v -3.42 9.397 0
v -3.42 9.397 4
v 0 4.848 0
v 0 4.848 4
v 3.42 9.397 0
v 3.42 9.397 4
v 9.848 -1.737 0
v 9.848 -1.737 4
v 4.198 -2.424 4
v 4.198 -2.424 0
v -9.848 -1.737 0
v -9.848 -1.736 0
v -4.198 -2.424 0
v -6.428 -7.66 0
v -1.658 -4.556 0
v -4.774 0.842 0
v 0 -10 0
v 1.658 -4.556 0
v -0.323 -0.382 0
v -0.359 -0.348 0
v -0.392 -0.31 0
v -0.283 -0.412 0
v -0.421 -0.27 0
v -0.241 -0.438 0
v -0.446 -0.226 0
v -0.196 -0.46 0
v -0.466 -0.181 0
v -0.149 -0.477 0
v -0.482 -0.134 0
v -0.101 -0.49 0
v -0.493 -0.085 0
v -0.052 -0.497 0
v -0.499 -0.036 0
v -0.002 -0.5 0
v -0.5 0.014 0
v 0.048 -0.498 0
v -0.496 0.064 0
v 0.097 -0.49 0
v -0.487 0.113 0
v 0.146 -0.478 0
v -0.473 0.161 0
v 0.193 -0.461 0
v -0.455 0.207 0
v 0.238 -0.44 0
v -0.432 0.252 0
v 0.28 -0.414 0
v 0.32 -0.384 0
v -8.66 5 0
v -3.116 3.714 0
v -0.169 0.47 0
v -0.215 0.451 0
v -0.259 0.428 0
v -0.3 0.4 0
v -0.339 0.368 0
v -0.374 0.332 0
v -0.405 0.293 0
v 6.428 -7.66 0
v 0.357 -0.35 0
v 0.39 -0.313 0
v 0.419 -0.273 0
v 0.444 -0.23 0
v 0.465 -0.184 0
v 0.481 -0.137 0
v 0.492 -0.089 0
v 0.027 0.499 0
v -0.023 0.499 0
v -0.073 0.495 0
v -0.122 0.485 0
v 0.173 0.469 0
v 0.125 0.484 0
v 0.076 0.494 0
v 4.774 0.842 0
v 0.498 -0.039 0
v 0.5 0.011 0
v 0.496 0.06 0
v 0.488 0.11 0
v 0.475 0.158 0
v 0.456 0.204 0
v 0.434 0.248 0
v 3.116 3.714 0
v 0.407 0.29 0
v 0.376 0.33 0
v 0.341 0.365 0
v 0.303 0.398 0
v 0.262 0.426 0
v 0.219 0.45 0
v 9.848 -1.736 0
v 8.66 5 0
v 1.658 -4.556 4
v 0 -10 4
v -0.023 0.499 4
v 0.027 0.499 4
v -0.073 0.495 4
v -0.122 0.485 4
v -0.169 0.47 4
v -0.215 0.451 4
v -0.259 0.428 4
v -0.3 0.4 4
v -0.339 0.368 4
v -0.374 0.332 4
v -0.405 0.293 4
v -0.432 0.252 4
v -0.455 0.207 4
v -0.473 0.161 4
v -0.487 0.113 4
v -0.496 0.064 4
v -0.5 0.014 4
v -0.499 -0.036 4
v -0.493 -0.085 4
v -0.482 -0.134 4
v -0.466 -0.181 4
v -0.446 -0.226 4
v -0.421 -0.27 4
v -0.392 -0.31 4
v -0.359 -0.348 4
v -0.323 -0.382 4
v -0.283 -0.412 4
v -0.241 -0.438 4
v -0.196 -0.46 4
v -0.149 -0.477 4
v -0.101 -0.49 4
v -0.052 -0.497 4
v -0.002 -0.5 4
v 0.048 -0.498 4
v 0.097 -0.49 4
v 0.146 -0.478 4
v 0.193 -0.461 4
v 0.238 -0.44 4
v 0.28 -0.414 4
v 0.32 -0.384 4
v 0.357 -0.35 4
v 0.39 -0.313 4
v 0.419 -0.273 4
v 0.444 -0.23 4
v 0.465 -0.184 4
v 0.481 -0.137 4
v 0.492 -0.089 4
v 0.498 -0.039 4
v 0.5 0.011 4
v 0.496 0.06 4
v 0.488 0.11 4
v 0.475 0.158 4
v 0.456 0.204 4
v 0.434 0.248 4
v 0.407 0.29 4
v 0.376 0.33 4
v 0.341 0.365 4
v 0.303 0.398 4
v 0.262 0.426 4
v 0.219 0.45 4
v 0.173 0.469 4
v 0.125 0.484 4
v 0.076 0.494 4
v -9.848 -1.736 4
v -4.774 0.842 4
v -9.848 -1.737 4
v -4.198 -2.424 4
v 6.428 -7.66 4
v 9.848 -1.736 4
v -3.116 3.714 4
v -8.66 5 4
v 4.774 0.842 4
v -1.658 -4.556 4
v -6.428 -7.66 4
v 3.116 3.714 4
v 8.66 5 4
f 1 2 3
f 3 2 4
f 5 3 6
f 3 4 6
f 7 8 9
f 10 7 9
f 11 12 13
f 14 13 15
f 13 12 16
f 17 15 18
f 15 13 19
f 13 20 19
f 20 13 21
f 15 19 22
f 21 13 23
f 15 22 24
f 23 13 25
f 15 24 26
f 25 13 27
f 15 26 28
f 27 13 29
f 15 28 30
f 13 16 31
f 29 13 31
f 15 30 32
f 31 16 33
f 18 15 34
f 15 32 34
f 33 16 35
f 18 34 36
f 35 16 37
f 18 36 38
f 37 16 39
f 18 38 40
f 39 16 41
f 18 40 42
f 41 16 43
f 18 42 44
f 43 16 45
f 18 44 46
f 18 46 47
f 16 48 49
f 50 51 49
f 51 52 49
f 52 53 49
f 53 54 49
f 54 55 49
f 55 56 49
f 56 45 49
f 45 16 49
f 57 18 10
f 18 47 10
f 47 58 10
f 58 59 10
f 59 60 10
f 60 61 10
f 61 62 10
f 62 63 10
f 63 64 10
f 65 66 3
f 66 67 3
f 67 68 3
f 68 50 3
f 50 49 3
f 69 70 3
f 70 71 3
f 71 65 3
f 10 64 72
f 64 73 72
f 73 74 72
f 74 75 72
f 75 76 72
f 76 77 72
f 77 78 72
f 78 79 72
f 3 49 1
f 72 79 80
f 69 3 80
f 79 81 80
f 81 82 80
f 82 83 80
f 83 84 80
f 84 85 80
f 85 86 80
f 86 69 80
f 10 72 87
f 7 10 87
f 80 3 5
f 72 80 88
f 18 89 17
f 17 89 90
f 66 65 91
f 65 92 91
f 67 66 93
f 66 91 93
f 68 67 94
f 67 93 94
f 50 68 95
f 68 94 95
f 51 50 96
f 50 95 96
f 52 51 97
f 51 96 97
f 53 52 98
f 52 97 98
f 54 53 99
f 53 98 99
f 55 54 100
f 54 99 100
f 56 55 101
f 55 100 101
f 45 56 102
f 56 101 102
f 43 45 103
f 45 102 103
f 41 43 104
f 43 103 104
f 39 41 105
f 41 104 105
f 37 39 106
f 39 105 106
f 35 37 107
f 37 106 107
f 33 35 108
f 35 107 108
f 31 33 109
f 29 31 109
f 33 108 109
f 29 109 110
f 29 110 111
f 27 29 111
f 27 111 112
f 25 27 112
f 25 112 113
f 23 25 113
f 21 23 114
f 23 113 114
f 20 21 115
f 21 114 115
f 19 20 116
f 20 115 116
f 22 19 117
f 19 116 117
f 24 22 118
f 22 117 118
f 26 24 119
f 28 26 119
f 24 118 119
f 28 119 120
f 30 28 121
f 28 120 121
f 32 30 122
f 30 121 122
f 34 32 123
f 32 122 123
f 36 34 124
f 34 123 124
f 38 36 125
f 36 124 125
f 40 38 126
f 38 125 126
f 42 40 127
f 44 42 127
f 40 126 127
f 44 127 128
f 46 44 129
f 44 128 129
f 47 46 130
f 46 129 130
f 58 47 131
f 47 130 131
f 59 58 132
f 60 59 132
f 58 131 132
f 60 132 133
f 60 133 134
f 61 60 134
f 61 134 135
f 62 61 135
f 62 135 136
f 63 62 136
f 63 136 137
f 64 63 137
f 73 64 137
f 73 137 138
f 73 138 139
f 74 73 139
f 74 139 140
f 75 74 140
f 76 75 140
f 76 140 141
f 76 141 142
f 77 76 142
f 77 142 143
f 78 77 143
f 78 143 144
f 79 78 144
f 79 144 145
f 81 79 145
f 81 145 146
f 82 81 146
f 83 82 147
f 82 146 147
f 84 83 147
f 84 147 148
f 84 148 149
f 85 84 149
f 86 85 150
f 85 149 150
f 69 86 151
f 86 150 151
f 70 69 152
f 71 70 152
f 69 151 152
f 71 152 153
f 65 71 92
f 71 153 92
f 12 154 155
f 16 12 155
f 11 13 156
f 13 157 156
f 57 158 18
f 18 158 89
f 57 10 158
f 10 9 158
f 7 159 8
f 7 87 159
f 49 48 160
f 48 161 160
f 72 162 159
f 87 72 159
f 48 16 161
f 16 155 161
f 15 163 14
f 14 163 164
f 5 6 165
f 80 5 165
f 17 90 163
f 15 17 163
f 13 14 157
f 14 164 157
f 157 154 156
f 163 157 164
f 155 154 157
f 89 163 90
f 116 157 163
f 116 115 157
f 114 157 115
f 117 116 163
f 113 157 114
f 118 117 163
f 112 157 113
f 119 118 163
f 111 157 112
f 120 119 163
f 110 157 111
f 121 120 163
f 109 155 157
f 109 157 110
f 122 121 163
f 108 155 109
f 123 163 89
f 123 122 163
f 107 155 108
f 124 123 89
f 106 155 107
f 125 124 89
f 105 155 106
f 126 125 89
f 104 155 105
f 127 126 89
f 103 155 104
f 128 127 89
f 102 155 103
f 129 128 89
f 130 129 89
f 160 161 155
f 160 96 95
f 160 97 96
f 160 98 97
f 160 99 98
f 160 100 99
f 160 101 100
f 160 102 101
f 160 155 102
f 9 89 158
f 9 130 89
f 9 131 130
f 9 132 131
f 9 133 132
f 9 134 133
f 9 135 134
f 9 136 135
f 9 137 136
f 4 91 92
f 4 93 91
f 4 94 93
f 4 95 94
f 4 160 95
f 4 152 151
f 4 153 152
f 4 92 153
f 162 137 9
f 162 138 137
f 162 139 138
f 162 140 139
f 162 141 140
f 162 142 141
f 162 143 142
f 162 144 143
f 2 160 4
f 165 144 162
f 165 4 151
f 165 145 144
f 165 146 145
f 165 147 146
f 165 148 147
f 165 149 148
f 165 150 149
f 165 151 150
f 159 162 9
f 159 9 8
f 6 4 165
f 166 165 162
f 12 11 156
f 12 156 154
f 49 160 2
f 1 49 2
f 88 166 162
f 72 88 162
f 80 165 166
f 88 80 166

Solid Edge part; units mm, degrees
sketch "Sketch1" plane through (0, 0, 0) normal (0, 0, 1) x (1, 0, 0)
  circle A0 centre (0, 0) radius 10
extrude "Protrusion1" add sketch "Sketch1" along normal blind 4
sketch "Sketch2" plane through (0, 0, 4) normal (0, 0, 1) x (1, 0, 0)
  line L0 (-3.4202, 9.3969) -> (0, 4.848)
  line L1 (0, 4.848) -> (3.4202, 9.3969)
  line L2 (3.4202, 9.3969) -> (0, 11.9685)
  line L3 (0, 11.9685) -> (-3.4202, 9.3969)
  line L4 (-8.6603, 5) -> (-3.1162, 3.7138)
  line L5 (-3.1162, 3.7138) -> (-3.4202, 9.3969)
  line L6 (-3.4202, 9.3969) -> (-7.6932, 9.1684)
  line L7 (-7.6932, 9.1684) -> (-8.6603, 5)
  line L8 (-9.8481, -1.7365) -> (-4.7743, 0.8418)
  line L9 (-4.7743, 0.8418) -> (-8.6603, 5)
  line L10 (-8.6603, 5) -> (-11.7866, 2.0783)
  line L11 (-11.7866, 2.0783) -> (-9.8481, -1.7365)
  line L12 (-6.4279, -7.6604) -> (-4.1985, -2.424)
  line L13 (-4.1985, -2.424) -> (-9.8481, -1.7365)
  line L14 (-9.8481, -1.7365) -> (-10.365, -5.9842)
  line L15 (-10.365, -5.9842) -> (-6.4279, -7.6604)
  line L16 (0, -10) -> (-1.6581, -4.5556)
  line L17 (-1.6581, -4.5556) -> (-6.4279, -7.6604)
  line L18 (-6.4279, -7.6604) -> (-4.0935, -11.2467)
  line L19 (-4.0935, -11.2467) -> (0, -10)
  line L20 (6.4279, -7.6604) -> (1.6581, -4.5556)
  line L21 (1.6581, -4.5556) -> (0, -10)
  line L22 (0, -10) -> (4.0935, -11.2467)
  line L23 (4.0935, -11.2467) -> (6.4279, -7.6604)
  line L24 (9.8481, -1.7365) -> (4.1985, -2.424)
  line L25 (4.1985, -2.424) -> (6.4279, -7.6604)
  line L26 (6.4279, -7.6604) -> (10.365, -5.9842)
  line L27 (10.365, -5.9842) -> (9.8481, -1.7365)
  line L28 (8.6603, 5) -> (4.7743, 0.8418)
  line L29 (4.7743, 0.8418) -> (9.8481, -1.7365)
  line L30 (9.8481, -1.7365) -> (11.7866, 2.0783)
  line L31 (11.7866, 2.0783) -> (8.6603, 5)
  line L32 (3.4202, 9.3969) -> (3.1162, 3.7138)
  line L33 (3.1162, 3.7138) -> (8.6603, 5)
  line L34 (8.6603, 5) -> (7.6932, 9.1684)
  line L35 (7.6932, 9.1684) -> (3.4202, 9.3969)
extrude "ExtrudedCutout_1" cut sketch "Sketch2" against normal blind 4
sketch "Sketch3" plane through (0, -0.3015, 4) normal (0, 0, 1) x (0.0534, 0.9986, 0)
  circle A0 centre (0.3011, 0.0161) radius 0.5
extrude "ExtrudedCutout_2" cut sketch "Sketch3" against normal blind 23.5117
